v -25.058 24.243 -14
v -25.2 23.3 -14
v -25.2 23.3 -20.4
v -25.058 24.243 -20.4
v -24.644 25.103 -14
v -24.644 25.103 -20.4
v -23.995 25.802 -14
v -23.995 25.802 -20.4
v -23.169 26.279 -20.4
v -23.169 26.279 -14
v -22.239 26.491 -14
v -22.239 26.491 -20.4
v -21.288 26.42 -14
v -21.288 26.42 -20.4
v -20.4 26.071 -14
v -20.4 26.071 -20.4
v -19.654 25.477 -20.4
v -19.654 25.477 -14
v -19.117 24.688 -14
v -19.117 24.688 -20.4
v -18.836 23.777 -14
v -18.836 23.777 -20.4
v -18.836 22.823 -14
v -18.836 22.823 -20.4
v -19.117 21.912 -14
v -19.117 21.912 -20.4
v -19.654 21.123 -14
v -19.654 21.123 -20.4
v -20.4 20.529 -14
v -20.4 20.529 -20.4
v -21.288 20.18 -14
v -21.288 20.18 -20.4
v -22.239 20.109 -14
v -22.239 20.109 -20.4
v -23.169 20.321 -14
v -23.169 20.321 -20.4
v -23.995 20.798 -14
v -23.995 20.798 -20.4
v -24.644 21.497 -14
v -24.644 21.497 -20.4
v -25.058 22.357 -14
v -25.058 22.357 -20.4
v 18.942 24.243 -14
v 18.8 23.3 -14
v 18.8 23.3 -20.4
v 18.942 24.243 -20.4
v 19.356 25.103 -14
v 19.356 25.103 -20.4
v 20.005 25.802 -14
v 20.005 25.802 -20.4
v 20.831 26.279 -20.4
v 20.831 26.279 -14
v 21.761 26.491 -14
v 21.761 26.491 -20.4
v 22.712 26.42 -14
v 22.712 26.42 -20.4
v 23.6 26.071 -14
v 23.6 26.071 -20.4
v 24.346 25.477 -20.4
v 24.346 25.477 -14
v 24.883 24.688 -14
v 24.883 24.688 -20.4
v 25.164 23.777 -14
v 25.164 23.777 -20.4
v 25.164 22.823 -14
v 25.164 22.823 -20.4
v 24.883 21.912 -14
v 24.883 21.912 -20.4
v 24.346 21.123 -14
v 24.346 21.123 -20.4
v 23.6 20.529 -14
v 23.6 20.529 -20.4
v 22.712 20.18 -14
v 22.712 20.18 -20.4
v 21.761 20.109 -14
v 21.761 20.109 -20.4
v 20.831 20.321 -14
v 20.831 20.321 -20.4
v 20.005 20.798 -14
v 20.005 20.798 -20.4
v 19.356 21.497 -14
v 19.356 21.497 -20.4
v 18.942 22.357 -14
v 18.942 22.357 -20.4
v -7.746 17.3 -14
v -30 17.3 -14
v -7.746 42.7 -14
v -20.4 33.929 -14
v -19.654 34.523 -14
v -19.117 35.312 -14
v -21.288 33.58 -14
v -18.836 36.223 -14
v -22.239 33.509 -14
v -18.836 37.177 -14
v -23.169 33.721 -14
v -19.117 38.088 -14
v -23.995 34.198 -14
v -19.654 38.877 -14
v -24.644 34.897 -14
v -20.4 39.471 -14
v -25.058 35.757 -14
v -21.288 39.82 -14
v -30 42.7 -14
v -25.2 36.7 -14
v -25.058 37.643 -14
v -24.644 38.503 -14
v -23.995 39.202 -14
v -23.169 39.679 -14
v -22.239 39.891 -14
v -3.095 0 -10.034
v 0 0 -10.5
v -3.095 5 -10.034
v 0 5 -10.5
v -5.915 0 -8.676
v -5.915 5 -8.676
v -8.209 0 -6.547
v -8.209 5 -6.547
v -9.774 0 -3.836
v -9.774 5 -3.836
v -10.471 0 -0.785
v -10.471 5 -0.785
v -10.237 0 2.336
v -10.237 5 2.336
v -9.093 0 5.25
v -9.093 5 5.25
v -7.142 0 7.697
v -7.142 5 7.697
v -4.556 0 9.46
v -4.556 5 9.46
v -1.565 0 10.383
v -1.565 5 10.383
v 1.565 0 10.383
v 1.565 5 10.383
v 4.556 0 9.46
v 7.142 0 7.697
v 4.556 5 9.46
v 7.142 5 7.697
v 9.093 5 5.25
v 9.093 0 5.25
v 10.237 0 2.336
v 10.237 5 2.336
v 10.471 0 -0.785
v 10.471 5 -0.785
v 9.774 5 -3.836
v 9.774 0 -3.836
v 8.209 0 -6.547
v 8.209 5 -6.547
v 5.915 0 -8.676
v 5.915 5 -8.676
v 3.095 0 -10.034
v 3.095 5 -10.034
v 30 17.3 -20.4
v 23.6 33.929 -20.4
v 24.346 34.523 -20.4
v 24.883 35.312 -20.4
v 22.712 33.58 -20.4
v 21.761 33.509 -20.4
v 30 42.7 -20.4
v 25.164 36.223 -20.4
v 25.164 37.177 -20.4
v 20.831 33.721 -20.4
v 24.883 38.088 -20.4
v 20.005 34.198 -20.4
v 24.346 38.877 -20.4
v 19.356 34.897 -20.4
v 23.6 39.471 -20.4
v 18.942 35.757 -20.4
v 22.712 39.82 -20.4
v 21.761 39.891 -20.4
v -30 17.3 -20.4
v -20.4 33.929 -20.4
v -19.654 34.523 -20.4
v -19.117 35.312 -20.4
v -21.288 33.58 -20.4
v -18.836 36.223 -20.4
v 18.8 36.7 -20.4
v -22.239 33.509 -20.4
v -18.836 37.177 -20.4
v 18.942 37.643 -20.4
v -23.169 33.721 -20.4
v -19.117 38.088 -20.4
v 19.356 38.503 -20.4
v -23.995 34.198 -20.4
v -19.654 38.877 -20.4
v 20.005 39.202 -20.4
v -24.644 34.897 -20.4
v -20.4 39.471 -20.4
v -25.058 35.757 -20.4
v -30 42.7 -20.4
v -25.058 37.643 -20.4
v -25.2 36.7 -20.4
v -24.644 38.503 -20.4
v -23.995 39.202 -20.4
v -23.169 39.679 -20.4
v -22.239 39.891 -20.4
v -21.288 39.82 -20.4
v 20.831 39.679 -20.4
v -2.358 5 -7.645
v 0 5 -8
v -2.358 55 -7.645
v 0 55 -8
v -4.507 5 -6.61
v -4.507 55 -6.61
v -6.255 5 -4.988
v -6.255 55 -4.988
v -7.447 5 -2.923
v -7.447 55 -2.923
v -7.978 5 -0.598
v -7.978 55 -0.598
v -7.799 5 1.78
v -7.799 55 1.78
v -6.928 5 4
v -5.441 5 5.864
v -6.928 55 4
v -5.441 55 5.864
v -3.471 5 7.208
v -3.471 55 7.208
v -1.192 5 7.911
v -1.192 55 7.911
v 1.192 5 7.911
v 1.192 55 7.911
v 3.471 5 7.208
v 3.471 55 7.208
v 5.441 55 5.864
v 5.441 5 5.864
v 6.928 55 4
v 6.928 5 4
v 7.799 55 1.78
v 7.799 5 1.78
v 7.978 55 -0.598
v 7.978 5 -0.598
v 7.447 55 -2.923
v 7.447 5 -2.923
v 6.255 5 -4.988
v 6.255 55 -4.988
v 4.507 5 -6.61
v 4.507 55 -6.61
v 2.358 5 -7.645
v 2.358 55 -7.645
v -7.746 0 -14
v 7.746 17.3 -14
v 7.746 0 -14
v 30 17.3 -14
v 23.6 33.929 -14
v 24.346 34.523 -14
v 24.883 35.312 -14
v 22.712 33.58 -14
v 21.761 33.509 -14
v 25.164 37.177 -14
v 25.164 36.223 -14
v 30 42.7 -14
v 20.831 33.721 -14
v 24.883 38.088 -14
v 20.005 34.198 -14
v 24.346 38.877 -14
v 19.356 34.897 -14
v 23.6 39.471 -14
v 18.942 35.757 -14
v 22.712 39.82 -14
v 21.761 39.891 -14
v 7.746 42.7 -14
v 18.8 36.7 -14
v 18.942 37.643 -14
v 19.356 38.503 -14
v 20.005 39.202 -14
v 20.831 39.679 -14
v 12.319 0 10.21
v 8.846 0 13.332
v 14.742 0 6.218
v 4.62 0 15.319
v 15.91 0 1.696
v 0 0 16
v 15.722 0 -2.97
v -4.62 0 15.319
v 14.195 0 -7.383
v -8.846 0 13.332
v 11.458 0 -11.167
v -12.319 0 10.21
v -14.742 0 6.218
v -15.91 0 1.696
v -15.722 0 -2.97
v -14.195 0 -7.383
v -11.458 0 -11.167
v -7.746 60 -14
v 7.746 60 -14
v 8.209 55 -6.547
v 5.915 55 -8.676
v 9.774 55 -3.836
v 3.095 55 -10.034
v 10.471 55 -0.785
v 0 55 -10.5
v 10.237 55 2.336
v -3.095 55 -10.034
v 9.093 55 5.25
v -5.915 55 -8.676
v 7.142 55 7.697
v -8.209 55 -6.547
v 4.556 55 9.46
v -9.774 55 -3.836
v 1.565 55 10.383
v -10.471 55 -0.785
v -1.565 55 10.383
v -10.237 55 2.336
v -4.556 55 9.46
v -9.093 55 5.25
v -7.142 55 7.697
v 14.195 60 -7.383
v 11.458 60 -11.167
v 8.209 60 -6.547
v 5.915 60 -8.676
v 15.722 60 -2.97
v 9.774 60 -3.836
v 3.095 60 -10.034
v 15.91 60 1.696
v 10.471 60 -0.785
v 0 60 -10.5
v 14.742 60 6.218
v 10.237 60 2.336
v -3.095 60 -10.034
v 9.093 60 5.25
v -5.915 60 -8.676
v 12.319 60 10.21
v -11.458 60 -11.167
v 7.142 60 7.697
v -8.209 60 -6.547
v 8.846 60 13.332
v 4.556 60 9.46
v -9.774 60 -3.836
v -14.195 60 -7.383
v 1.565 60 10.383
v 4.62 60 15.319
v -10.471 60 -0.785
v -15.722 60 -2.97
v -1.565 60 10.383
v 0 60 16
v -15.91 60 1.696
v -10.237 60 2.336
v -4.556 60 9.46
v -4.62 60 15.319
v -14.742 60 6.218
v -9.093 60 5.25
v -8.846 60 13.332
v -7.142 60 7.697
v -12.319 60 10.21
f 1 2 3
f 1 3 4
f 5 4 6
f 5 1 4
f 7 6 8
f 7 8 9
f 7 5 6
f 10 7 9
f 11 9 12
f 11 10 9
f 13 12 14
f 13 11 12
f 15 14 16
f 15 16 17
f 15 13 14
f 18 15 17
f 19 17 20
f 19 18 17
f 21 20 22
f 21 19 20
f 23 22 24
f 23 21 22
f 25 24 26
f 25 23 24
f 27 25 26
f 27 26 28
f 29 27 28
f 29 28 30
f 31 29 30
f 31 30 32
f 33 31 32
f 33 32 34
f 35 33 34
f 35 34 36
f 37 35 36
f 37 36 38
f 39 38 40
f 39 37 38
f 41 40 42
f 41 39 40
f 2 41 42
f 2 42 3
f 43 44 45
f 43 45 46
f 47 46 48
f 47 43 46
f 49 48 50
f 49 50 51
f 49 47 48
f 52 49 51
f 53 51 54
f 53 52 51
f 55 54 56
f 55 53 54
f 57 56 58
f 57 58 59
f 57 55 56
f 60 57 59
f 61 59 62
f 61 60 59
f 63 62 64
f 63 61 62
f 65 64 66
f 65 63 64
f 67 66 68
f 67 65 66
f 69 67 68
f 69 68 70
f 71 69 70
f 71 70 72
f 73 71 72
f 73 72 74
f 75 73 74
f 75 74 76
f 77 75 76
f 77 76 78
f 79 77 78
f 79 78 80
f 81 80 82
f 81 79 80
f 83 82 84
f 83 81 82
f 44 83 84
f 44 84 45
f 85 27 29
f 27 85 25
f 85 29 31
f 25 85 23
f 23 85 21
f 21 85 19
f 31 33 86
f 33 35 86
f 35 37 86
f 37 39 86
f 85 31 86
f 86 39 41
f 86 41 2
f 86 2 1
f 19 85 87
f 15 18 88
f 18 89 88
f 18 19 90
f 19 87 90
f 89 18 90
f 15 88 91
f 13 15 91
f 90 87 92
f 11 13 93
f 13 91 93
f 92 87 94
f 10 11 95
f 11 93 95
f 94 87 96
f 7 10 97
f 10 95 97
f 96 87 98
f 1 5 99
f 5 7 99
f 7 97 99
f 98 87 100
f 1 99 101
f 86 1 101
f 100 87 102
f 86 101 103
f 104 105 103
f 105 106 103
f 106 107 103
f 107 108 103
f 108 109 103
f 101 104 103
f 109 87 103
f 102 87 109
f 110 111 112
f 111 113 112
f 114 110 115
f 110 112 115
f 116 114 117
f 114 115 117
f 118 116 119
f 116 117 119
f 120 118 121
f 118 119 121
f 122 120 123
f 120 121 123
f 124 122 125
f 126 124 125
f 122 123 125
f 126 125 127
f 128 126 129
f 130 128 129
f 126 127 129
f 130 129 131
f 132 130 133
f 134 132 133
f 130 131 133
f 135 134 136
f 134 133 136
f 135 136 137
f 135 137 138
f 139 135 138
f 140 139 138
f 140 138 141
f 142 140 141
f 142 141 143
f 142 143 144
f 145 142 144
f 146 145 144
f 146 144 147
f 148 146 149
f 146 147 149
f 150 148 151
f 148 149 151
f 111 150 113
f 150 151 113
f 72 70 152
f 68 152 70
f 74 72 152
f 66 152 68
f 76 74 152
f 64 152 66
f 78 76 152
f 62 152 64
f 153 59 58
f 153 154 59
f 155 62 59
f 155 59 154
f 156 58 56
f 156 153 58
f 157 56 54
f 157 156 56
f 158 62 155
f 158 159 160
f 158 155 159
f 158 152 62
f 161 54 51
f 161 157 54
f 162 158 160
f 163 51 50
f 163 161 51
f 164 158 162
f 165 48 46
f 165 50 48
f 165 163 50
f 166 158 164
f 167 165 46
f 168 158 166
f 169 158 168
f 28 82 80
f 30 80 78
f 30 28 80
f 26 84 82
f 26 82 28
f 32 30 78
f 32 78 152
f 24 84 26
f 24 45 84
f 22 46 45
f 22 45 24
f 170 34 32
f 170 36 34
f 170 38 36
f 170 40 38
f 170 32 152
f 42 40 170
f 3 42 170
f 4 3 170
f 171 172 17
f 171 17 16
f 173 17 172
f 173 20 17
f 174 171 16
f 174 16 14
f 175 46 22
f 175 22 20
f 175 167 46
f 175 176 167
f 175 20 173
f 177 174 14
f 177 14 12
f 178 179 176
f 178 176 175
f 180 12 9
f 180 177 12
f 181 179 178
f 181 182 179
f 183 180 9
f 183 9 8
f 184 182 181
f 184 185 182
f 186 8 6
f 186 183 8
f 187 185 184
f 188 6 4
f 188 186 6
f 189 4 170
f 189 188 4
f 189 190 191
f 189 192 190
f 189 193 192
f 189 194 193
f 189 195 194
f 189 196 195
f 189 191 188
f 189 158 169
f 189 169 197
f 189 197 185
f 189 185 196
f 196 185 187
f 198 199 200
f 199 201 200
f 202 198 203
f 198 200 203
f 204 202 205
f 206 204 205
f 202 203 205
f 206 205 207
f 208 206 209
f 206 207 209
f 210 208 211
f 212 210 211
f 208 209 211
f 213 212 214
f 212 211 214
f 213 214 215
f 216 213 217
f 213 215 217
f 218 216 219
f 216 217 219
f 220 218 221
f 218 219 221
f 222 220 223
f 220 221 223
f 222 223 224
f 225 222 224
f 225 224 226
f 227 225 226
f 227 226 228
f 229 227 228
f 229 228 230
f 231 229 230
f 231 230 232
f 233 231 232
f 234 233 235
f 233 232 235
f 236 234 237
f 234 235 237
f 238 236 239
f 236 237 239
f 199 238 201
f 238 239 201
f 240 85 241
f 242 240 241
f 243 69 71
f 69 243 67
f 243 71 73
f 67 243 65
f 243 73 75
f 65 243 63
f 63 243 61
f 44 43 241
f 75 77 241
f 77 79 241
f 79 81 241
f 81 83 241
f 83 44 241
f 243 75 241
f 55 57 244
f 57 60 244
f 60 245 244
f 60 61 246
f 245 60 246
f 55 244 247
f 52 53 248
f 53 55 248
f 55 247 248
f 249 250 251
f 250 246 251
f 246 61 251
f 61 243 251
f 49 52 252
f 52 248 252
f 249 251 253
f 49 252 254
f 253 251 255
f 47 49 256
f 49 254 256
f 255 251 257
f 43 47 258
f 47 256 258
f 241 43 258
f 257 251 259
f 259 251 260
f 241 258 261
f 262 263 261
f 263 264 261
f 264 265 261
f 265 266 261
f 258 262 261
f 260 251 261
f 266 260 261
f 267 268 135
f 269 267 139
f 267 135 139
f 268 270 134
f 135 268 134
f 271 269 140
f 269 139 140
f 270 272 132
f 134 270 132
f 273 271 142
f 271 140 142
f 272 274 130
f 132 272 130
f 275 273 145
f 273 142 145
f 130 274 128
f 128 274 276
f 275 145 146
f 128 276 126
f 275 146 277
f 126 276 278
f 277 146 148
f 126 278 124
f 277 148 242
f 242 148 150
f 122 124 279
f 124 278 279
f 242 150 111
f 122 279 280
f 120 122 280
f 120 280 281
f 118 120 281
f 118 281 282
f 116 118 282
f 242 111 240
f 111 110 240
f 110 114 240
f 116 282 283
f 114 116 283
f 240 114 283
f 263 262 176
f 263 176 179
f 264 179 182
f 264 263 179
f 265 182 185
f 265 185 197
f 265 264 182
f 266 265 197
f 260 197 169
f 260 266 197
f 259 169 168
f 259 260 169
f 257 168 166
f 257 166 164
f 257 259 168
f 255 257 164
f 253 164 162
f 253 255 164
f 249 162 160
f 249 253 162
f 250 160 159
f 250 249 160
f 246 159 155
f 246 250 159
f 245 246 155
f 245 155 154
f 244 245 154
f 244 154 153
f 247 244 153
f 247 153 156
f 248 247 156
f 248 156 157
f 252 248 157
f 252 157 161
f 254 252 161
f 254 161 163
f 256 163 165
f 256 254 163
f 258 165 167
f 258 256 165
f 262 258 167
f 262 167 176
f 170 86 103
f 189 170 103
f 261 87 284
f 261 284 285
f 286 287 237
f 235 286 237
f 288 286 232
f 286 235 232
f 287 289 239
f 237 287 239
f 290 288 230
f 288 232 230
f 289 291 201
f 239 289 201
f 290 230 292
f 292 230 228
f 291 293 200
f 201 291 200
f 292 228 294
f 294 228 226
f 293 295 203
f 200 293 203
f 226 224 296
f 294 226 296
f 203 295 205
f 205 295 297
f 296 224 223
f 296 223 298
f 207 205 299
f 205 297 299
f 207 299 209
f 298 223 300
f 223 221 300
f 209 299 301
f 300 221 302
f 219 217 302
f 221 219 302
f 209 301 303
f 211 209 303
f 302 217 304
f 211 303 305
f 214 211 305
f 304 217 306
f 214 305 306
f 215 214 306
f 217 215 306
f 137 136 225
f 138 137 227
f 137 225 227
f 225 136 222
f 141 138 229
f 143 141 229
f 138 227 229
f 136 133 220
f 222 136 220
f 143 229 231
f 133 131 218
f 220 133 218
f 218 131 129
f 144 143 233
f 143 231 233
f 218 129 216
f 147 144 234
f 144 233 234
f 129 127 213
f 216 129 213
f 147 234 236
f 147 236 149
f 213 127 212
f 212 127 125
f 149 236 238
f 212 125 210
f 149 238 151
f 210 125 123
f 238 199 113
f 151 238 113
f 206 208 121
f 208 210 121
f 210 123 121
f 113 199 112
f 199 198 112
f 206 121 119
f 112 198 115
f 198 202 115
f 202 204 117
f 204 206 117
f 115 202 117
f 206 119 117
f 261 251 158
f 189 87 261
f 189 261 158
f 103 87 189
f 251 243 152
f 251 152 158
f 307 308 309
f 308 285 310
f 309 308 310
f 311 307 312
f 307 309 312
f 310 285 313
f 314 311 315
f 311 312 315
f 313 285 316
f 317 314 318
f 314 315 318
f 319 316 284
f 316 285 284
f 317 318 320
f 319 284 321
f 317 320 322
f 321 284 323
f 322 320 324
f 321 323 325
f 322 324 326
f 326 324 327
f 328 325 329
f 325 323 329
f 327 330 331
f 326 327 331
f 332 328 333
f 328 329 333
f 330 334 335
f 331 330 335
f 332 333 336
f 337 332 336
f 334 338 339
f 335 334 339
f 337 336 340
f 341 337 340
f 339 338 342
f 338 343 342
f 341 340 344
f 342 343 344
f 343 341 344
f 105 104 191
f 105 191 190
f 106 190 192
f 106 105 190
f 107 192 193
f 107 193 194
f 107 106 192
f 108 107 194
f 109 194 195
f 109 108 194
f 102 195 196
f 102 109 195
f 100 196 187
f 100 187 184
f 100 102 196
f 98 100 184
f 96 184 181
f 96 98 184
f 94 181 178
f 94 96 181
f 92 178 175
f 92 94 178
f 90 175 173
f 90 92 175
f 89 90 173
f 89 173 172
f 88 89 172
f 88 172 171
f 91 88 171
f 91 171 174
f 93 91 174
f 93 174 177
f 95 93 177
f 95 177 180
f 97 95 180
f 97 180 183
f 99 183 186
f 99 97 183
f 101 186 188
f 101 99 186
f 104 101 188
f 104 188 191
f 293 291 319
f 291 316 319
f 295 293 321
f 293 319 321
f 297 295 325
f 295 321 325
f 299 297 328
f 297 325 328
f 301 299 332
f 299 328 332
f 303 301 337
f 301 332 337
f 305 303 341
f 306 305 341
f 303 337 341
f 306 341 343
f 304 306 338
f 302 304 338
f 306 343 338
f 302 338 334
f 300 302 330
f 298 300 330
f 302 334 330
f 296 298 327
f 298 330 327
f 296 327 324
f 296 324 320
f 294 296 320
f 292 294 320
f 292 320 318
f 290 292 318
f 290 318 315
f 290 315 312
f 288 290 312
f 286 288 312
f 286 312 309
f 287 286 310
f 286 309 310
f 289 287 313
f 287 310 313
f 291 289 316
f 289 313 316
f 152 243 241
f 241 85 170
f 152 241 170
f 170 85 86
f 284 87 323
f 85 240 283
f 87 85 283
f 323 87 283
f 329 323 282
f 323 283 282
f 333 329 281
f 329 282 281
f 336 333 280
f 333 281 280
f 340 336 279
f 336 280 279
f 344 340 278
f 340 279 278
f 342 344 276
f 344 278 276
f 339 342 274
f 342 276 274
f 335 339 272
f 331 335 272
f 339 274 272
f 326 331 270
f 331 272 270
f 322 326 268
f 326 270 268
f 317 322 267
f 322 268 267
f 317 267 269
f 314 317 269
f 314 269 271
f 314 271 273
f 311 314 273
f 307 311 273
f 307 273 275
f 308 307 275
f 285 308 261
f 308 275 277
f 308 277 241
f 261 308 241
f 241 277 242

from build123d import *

# Parameters (mm, degrees)
CROQUIS2_W              = 30
CROQUIS2_H              = 10
CORTAR_EXTRUIR1_DEPTH   = 64
CROQUIS3_W              = 60
CROQUIS3_H              = 25.4
CROQUIS3_R              = 3.2
SALIENTE_EXTRUIR1_DEPTH = 6.4


with BuildPart() as part:
    # Croquis1 → Revolución1 (revolve)
    with BuildSketch(Plane.XY, mode=Mode.PRIVATE) as revoluci_n1_sk:
        Polygon((-8, 55), (-10.5, 55), (-10.5, 60), (-16, 60), (-16, 0), (-10.5, 0), (-10.5, 5), (-8, 5), align=None)
    revolve(revoluci_n1_sk.sketch.rotate(Axis((0, 0, 0), (0, 1, 0)), 270), axis=Axis((0, 0, 0), (0, 1, 0)))

    # Croquis2 → Cortar-Extruir1 (cut)
    with BuildSketch(Plane.XZ):
        with Locations((0, -19)):
            Rectangle(CROQUIS2_W, CROQUIS2_H)
    extrude(amount=-CORTAR_EXTRUIR1_DEPTH, mode=Mode.SUBTRACT)

    # Croquis3 → Saliente-Extruir1 (add)
    with BuildSketch(Plane(origin=(0, 0, -14), x_dir=(-1, 0, 0), z_dir=(0, 0, -1))):
        with Locations((0, 30)):
            Rectangle(CROQUIS3_W, CROQUIS3_H)
        with Locations((-22, 36.7)):
            Circle(CROQUIS3_R, mode=Mode.SUBTRACT)
        with Locations((-22, 23.3)):
            Circle(CROQUIS3_R, mode=Mode.SUBTRACT)
        with Locations((22, 36.7)):
            Circle(CROQUIS3_R, mode=Mode.SUBTRACT)
        with Locations((22, 23.3)):
            Circle(CROQUIS3_R, mode=Mode.SUBTRACT)
    extrude(amount=SALIENTE_EXTRUIR1_DEPTH)


solid = part.part
